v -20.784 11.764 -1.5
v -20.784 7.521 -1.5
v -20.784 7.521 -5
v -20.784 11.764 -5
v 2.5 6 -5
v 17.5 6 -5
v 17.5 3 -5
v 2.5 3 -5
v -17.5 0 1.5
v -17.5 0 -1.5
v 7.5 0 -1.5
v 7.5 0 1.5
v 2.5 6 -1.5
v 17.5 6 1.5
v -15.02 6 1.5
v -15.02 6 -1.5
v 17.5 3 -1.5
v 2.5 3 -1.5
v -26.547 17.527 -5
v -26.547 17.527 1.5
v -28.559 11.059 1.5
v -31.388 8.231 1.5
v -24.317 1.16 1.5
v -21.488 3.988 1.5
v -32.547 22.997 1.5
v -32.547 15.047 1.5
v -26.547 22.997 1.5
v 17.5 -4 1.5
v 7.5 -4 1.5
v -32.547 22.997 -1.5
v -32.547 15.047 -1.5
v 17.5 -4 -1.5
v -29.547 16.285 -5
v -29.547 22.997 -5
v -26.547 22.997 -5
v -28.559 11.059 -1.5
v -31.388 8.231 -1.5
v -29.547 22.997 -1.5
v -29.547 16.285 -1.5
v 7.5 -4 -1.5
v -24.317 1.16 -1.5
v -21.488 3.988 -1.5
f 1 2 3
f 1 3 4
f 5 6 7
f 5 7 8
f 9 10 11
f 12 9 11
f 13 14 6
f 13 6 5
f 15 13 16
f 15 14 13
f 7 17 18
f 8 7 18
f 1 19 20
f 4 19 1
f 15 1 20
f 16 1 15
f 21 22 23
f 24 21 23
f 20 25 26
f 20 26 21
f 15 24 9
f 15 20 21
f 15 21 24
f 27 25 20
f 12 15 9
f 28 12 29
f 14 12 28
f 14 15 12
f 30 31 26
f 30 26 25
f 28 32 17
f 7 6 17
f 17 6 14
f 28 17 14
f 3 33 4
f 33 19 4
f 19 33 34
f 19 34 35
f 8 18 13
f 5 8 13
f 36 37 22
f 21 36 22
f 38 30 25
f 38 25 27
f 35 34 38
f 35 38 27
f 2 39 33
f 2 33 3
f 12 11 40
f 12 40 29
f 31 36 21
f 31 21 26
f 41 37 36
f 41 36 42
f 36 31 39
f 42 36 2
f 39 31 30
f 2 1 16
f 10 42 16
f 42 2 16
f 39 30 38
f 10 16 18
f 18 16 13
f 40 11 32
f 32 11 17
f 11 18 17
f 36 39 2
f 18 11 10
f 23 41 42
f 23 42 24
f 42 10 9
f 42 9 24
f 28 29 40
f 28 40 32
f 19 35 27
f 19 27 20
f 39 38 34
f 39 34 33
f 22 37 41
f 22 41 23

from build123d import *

# Parameters (mm, degrees)
SKETCH1_W           = 35
SKETCH1_H           = 3
BOSS_EXTRUDE1_DEPTH = 6
BOSS_EXTRUDE2_DEPTH = 3
SKETCH4_W           = 15
SKETCH4_H           = 3
BOSS_EXTRUDE3_DEPTH = 3.5
SKETCH5_W           = 10
SKETCH5_H           = 3
BOSS_EXTRUDE4_DEPTH = 4
SKETCH6_W           = 3
SKETCH6_H           = 10
BOSS_EXTRUDE5_DEPTH = 4


with BuildPart() as part:
    # Sketch1 → Boss-Extrude1 (new body)
    with BuildSketch(Plane(origin=(0, 0, 0), x_dir=(1, 0, 0), z_dir=(0, 1, 0))):
        Rectangle(SKETCH1_W, SKETCH1_H)
    extrude(amount=BOSS_EXTRUDE1_DEPTH)

    # Sketch3 → Boss-Extrude2 (add)
    with BuildSketch(Plane(origin=(0, 0, -1.5), x_dir=(-1, 0, 0), z_dir=(0, 0, -1))):
        Polygon((17.5, 0), (32.547232304, 15.047232304), (32.547232304, 22.997232304), (26.547232304, 22.997232304), (26.547232304, 17.527232304), (15.02, 6), (17.5, 6), align=None)
    extrude(amount=-BOSS_EXTRUDE2_DEPTH)

    # Sketch4 → Boss-Extrude3 (add)
    with BuildSketch(Plane(origin=(0, 0, -1.5), x_dir=(-1, 0, 0), z_dir=(0, 0, -1))):
        with Locations((-10, 4.5)):
            Rectangle(SKETCH4_W, SKETCH4_H)
        Polygon((20.783616152, 11.763616152), (26.547232304, 17.527232304), (26.547232304, 22.997232304), (29.547232304, 22.997232304), (29.547232304, 16.284591617), (20.783616152, 7.520975465), align=None)
    extrude(amount=BOSS_EXTRUDE3_DEPTH)

    # Sketch5 → Boss-Extrude4 (add)
    with BuildSketch(Plane.XZ):
        with Locations((12.5, 0)):
            Rectangle(SKETCH5_W, SKETCH5_H)
    extrude(amount=BOSS_EXTRUDE4_DEPTH)

    # Sketch6 → Boss-Extrude5 (add)
    with BuildSketch(Plane(origin=(-8.75, -8.75, 0), x_dir=(0, 0, 1), z_dir=(-0.707106781, -0.707106781, 0))):
        with Locations((0, 23.014368671)):
            Rectangle(SKETCH6_W, SKETCH6_H)
    extrude(amount=BOSS_EXTRUDE5_DEPTH)


solid = part.part
